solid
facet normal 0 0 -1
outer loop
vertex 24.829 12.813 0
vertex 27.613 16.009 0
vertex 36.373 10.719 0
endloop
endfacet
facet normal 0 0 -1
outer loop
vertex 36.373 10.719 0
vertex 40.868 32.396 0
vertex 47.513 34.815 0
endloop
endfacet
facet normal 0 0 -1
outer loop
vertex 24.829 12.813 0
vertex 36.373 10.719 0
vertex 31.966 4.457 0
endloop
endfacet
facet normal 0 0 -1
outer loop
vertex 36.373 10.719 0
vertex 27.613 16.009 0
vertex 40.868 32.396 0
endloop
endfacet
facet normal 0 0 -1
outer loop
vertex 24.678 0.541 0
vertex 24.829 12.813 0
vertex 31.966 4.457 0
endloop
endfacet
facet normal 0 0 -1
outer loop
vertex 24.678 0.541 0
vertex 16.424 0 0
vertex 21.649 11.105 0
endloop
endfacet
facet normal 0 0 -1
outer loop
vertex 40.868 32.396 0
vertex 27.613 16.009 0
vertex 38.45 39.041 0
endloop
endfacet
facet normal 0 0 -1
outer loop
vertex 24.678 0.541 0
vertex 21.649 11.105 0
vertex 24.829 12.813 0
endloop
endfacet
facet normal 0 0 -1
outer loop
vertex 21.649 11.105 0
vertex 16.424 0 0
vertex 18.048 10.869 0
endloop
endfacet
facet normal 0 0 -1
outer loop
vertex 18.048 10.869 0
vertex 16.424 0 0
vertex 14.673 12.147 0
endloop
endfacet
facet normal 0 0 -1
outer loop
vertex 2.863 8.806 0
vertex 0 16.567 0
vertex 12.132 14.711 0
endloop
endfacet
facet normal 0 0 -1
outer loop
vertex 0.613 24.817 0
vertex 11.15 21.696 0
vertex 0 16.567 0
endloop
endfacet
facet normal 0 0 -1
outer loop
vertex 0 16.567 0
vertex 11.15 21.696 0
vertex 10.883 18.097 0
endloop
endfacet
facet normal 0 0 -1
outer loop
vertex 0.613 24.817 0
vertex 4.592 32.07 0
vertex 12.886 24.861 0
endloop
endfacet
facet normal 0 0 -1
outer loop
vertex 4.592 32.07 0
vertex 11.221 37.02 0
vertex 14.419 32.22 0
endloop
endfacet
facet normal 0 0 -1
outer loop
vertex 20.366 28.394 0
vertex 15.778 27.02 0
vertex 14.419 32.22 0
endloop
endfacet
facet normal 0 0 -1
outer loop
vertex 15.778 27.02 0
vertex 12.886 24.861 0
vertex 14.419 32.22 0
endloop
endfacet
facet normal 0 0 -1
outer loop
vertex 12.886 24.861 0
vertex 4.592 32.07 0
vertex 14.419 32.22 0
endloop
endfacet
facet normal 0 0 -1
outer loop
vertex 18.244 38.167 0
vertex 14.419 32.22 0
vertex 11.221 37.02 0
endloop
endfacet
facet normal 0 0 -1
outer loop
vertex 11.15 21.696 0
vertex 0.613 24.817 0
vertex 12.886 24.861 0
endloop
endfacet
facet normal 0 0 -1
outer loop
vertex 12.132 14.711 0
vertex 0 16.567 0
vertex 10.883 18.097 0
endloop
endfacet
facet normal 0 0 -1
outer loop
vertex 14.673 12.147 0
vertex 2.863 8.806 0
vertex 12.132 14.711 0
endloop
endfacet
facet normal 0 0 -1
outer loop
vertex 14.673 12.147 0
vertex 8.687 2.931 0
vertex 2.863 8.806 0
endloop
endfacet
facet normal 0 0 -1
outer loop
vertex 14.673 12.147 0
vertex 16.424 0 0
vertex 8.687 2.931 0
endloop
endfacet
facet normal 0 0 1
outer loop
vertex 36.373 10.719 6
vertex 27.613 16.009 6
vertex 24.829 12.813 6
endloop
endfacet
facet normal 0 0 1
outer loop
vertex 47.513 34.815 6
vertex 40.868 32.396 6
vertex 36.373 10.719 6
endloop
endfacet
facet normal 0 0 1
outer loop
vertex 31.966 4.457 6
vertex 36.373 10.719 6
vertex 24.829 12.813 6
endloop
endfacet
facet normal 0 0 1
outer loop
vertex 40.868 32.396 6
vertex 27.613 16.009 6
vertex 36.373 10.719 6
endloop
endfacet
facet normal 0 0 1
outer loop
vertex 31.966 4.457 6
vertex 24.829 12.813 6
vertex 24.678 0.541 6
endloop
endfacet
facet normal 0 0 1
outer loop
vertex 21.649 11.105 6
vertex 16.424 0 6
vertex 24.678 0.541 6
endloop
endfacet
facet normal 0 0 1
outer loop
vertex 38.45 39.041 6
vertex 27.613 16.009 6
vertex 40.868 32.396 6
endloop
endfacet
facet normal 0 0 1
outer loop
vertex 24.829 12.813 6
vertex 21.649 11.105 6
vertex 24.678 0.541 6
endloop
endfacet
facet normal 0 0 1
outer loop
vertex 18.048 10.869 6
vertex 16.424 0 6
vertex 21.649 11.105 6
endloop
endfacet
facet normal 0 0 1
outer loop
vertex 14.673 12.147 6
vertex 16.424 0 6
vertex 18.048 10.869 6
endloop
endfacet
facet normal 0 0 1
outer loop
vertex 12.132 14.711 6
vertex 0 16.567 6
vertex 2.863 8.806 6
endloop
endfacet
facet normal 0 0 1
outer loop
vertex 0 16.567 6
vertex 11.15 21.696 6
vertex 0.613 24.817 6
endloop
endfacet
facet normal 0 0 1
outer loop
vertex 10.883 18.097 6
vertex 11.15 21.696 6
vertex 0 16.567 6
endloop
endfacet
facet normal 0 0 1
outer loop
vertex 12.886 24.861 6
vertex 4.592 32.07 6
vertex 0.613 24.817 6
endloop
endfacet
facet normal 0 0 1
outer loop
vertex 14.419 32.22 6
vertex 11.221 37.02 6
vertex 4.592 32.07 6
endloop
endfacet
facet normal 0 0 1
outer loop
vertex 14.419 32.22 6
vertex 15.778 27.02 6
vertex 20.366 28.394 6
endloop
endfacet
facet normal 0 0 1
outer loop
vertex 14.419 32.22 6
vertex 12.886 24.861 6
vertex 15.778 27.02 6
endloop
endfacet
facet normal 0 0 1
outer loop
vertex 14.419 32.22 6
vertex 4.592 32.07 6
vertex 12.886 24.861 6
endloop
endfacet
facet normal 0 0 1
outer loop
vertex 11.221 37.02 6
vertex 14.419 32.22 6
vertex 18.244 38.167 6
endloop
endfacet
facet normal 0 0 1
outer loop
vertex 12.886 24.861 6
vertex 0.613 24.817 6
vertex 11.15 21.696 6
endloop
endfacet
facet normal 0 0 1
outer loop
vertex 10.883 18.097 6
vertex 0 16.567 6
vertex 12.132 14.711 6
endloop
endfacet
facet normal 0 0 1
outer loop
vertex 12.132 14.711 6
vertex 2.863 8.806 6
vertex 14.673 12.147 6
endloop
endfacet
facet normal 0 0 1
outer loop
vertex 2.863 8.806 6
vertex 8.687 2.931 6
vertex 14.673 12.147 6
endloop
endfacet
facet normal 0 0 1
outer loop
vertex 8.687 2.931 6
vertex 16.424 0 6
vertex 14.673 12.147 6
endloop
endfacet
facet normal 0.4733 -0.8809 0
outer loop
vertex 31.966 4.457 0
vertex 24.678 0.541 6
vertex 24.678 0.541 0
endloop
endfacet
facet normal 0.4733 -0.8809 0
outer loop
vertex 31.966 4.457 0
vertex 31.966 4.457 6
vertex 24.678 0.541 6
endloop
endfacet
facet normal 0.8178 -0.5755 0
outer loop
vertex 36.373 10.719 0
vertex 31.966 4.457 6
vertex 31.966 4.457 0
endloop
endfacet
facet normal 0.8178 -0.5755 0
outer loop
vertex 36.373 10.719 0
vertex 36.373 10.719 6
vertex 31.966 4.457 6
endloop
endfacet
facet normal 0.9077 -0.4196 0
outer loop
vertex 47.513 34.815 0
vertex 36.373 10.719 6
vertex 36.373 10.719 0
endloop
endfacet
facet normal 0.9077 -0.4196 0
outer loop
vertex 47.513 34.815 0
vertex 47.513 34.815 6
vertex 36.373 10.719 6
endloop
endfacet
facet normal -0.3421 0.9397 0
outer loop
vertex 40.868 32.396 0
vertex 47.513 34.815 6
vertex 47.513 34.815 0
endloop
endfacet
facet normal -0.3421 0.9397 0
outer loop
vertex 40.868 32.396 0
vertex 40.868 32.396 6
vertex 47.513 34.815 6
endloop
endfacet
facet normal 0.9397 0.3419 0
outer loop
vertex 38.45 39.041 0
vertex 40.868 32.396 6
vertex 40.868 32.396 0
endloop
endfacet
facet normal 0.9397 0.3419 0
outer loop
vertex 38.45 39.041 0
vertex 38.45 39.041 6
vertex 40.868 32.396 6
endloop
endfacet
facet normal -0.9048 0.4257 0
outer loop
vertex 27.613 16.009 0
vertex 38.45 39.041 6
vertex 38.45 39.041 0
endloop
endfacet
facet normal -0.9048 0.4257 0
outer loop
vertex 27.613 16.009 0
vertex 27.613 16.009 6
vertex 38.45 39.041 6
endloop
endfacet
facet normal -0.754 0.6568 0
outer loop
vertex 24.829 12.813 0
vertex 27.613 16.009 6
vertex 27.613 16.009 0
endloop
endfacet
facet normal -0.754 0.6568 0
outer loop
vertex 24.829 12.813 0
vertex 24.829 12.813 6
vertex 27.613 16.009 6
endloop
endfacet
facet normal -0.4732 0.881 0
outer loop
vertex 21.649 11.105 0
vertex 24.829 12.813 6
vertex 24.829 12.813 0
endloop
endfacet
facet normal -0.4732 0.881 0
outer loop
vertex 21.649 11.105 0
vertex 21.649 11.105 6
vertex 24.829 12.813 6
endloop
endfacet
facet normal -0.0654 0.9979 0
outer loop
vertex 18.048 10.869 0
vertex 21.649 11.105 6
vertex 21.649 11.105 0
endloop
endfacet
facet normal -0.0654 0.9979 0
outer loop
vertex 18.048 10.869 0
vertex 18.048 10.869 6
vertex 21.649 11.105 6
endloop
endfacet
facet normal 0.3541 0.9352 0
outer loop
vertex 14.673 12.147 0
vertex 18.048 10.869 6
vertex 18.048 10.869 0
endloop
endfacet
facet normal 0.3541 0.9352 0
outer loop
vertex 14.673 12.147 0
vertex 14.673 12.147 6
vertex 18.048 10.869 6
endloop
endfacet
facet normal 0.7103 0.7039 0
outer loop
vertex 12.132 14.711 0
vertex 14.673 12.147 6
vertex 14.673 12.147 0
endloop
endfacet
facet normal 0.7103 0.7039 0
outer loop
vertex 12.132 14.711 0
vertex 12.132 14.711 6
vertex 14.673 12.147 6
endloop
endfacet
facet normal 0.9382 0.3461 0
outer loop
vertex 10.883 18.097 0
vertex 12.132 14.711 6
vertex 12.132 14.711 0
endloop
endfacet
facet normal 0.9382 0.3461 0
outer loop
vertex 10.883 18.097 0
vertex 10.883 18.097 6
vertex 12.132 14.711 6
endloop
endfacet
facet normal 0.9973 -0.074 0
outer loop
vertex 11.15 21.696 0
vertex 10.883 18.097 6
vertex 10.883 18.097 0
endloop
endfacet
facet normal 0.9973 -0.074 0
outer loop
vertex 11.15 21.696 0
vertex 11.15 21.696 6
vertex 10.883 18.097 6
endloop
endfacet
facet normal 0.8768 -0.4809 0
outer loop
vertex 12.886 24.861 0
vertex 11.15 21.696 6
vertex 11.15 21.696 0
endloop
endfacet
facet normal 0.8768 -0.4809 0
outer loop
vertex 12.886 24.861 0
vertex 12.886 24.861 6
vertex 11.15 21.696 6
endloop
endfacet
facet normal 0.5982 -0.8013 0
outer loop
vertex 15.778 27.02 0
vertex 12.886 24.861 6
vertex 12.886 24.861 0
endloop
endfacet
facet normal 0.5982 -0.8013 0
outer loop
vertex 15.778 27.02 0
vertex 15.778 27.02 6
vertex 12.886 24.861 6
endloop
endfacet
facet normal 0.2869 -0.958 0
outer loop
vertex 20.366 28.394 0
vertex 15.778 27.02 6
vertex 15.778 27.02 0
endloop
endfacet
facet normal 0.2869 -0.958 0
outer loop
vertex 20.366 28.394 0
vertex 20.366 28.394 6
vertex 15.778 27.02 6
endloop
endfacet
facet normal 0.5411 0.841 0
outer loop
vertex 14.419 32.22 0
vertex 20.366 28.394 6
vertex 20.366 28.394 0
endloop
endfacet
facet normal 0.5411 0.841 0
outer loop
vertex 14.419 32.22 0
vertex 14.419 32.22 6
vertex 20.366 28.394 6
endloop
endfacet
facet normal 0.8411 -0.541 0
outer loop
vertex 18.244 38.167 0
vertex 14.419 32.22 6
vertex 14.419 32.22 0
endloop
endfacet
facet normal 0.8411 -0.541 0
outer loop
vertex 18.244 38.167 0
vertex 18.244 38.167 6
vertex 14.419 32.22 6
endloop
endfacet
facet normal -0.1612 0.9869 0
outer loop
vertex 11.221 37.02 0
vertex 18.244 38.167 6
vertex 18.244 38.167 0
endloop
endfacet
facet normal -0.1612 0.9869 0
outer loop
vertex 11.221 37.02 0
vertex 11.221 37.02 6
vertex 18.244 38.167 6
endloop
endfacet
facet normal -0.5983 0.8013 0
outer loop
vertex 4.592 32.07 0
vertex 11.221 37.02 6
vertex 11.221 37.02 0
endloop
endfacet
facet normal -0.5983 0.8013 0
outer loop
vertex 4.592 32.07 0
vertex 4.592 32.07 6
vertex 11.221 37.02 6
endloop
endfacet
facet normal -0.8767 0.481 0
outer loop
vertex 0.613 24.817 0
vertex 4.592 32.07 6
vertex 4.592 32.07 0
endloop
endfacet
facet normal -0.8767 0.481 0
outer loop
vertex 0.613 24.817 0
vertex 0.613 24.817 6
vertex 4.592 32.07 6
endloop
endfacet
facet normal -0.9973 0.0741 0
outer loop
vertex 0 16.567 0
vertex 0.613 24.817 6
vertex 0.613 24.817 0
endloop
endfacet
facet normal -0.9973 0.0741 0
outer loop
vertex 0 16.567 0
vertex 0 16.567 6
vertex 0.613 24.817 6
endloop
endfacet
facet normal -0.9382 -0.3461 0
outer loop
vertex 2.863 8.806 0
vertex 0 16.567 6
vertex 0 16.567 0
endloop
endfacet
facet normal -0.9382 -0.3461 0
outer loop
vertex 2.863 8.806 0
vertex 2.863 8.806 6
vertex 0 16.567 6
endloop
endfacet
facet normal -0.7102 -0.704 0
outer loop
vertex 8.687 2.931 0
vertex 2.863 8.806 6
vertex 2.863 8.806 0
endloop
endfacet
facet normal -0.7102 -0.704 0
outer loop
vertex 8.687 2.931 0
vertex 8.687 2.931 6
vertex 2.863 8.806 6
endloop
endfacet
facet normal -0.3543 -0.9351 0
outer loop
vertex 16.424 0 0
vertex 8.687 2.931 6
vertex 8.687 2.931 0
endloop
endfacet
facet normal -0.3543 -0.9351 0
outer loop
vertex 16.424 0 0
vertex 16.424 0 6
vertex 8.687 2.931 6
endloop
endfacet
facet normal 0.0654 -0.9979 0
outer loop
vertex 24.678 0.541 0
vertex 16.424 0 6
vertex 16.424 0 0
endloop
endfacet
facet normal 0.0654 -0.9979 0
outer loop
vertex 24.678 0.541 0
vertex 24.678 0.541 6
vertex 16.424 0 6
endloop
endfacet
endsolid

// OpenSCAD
$fn = 32;

// ----------------------------------------------------------------------
// Hook plate: curl radius 14 mm over 245 degrees, 10 mm thick band
// ----------------------------------------------------------------------

// --- parameters (mm) ---
profile_height = 6;       // extrusion height
profile_points = 26;      // points of the closed outline

profile = [[14.419, 32.22], [18.244, 38.167], [11.221, 37.02], [4.592, 32.07], [0.613, 24.817], [0, 16.567], [2.863, 8.806], [8.687, 2.931], [16.424, 0], [24.678, 0.541], [31.966, 4.457], [36.373, 10.719], [47.513, 34.815], [40.868, 32.396], [38.45, 39.041], [27.613, 16.009], [24.829, 12.813], [21.649, 11.105], [18.048, 10.869], [14.673, 12.147], [12.132, 14.711], [10.883, 18.097], [11.15, 21.696], [12.886, 24.861], [15.778, 27.02], [20.366, 28.394]];  // single closed polygon, 26 points, counter clockwise

// --- the one profile operation ---
linear_extrude(height = profile_height) polygon(points = profile);
